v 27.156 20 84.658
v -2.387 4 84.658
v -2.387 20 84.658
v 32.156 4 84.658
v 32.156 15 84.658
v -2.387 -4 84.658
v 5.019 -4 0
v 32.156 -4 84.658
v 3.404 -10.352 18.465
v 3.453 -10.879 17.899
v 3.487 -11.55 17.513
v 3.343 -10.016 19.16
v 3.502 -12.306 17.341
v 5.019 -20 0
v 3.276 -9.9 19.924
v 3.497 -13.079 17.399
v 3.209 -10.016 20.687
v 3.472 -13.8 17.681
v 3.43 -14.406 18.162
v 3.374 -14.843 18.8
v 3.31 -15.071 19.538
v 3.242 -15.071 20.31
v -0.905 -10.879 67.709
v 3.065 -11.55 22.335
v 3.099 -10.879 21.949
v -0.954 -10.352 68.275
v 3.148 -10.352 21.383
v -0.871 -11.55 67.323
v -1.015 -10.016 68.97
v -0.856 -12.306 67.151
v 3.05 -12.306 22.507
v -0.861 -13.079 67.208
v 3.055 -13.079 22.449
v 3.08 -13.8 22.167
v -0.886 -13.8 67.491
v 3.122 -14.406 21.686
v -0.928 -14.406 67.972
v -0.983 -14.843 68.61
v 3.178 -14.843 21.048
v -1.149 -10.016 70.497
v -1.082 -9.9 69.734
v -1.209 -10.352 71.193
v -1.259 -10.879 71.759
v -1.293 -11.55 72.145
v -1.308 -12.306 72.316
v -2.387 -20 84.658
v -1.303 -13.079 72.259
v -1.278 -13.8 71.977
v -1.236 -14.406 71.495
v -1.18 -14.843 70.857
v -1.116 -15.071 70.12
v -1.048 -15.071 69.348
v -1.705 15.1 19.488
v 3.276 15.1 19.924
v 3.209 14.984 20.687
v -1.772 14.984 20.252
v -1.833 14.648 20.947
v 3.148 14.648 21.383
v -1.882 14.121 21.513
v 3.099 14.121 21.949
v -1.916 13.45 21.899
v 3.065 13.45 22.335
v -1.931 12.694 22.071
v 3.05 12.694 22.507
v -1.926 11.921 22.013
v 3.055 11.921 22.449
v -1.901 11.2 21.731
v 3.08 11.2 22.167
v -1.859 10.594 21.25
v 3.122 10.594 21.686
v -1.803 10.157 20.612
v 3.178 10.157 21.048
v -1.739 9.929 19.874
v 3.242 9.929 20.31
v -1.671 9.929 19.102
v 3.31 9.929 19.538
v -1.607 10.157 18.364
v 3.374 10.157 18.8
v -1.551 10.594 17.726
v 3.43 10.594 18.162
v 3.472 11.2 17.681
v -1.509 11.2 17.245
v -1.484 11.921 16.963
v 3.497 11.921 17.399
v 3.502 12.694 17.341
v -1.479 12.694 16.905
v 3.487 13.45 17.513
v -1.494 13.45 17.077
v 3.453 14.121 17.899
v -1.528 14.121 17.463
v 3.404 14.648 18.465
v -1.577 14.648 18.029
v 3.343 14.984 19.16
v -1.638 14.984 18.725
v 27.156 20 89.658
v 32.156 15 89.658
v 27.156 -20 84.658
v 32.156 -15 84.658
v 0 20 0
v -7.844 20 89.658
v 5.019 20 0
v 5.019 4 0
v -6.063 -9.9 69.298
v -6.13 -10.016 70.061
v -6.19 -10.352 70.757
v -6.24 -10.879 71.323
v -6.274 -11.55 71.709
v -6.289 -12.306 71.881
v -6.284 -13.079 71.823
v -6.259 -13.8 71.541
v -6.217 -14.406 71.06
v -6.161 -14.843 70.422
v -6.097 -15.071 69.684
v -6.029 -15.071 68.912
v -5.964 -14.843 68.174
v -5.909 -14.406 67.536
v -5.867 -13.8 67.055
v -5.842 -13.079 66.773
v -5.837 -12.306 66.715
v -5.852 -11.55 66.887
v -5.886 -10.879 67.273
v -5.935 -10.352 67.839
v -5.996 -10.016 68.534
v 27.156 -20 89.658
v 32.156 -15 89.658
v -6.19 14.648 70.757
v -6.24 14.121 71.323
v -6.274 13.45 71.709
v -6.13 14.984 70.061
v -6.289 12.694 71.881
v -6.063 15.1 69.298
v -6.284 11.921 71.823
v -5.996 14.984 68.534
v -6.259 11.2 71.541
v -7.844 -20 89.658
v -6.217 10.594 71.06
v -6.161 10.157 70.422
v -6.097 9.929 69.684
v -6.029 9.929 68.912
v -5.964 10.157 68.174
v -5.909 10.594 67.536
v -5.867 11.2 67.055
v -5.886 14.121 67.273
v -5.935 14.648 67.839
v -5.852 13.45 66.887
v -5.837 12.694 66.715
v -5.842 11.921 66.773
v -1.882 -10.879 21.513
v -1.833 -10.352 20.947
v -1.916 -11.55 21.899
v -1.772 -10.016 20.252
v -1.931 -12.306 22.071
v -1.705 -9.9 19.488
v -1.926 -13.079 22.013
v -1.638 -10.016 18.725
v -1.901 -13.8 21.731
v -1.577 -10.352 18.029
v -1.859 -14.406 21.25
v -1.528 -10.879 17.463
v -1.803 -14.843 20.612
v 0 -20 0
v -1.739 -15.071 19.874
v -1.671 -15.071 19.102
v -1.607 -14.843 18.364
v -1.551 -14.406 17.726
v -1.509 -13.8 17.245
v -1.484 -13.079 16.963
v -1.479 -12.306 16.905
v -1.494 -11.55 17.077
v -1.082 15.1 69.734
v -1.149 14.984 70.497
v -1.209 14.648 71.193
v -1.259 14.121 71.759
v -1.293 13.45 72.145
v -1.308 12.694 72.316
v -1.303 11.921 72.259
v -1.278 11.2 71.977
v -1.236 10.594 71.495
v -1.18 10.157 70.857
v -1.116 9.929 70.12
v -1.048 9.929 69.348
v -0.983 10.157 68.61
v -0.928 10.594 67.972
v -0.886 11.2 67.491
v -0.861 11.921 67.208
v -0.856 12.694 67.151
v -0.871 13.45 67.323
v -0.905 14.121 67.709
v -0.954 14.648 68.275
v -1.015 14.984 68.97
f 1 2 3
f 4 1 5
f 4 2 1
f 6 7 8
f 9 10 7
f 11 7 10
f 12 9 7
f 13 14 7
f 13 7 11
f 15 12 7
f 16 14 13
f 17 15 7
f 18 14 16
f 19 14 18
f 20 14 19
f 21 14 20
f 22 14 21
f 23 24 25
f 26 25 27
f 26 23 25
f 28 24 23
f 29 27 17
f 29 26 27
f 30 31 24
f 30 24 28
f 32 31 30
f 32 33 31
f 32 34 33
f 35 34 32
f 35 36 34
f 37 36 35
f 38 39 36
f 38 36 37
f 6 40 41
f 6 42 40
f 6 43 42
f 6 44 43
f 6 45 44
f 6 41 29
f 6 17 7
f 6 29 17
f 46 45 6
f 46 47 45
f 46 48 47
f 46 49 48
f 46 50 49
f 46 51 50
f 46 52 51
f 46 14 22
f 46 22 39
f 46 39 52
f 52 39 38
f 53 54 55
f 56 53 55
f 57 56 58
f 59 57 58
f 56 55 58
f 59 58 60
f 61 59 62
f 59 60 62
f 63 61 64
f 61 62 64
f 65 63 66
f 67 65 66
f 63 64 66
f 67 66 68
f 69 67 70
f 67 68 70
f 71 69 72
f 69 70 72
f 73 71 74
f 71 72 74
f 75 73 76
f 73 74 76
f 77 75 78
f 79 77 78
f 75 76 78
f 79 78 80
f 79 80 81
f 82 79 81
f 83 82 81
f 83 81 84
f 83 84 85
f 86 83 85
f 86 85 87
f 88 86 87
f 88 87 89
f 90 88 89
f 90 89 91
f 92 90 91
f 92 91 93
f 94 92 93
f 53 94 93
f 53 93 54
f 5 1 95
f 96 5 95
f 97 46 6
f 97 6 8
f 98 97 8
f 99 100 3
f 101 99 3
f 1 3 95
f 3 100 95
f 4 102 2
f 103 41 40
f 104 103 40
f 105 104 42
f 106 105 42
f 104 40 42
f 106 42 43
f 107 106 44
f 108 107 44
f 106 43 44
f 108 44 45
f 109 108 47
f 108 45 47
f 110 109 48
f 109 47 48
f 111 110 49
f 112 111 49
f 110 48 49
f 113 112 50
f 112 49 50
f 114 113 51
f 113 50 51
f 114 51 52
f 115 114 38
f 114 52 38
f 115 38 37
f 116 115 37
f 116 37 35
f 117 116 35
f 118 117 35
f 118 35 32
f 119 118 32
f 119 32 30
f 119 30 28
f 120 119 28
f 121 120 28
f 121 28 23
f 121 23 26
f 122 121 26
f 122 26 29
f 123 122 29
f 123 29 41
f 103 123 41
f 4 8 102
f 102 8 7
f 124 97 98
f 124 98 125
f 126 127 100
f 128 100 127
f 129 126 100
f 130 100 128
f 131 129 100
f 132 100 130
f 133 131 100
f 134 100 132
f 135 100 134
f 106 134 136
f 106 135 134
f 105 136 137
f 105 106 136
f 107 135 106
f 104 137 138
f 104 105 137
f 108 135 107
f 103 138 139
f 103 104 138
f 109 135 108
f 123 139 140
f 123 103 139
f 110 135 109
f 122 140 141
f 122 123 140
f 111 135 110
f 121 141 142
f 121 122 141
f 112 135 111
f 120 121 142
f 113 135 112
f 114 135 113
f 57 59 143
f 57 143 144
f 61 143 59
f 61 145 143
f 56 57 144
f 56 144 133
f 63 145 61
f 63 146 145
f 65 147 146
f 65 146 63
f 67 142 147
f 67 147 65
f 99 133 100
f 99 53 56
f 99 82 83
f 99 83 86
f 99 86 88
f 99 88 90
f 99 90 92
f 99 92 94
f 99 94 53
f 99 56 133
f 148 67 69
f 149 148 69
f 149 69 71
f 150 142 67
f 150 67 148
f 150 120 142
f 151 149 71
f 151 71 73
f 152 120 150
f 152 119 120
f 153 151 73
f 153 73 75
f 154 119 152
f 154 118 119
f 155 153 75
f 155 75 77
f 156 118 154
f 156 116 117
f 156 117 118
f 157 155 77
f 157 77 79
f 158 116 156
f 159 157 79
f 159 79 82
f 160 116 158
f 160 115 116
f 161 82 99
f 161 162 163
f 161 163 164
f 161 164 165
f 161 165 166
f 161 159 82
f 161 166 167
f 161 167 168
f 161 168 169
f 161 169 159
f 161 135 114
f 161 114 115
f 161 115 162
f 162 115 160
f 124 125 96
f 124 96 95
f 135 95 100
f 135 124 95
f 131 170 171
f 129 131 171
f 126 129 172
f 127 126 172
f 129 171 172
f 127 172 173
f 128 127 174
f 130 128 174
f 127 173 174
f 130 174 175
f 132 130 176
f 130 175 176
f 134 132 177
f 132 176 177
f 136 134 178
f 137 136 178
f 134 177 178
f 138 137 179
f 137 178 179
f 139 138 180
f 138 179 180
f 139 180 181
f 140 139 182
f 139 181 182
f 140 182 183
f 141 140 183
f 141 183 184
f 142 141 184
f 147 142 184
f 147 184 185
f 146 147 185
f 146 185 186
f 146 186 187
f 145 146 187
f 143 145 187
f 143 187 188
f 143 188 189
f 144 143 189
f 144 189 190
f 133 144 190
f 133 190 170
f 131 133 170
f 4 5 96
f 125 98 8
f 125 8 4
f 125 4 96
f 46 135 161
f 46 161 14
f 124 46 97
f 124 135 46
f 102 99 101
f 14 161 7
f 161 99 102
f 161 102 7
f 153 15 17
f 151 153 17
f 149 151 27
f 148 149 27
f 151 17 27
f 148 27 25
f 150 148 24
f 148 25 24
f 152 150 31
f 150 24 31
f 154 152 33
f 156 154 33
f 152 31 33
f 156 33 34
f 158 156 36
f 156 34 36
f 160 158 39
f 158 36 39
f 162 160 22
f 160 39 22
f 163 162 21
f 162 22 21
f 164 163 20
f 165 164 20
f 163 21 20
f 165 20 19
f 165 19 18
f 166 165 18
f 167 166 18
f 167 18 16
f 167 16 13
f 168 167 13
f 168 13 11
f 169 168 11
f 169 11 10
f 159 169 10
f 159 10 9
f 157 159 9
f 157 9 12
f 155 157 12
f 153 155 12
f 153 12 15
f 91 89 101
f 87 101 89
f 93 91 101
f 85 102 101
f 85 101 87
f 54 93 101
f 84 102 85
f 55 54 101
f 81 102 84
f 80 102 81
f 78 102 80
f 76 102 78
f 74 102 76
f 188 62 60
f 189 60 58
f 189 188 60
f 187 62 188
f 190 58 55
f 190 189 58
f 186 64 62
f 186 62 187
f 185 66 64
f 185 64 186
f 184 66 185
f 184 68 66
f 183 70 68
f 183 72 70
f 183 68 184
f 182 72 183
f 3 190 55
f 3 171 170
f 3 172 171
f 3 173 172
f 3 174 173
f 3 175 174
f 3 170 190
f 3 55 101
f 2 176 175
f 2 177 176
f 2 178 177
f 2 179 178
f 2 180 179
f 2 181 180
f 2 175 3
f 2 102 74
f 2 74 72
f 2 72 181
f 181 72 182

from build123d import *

# Parameters (mm, degrees)
F1_DEPTH = 20
F2_W     = 8
F2_H     = 84.6575228283
F5_DEPTH = 40.001
F6_R     = 2.6
F7_DEPTH = 12.815167995
F8_SIZE  = 5


with BuildPart() as f1:
    # F0 (on Front) → F1 (new body, symmetric)
    with BuildSketch(Plane.XZ):
        Polygon((-7.8440168473, 89.6575228283), (0, 0), (5.0190991877, 0), (-2.3874743419, 84.6575228283), (32.1559831527, 84.6575228283), (32.1559831527, 89.6575228283), align=None)
    extrude(amount=F1_DEPTH, both=True)

    # F2 (on face) → F3 (join, up to the next surface of F1)
    with BuildSketch(Plane.YZ.offset(32.1559831527)):
        with Locations((0, 42.3287614141)):
            Rectangle(F2_W, F2_H)
    extrude(until=Until.NEXT, dir=(-1, 0, 0))

    # F4 (on face) → F5 (cut, through all)
    with BuildSketch(Plane.XZ.offset(20)):
        Polygon((32.1559831527, 84.6575228283), (5.0190991877, 0), (32.1559831527, 0), align=None)
    extrude(amount=-F5_DEPTH, mode=Mode.SUBTRACT)

    # F6 (on face) → F7 (cut, through all)
    with BuildSketch(Plane(origin=(4.9809734905, 0, 0.4357787137), x_dir=(0, 1, 0), z_dir=(0.9961946981, 0, 0.0871557427))):
        with Locations((12.5, 69.5625566824)):
            Circle(F6_R)
        with Locations((12.5, 19.5625566824)):
            Circle(F6_R)
        with Locations((-12.5, 69.5625566824)):
            Circle(F6_R)
        with Locations((-12.5, 19.5625566824)):
            Circle(F6_R)
    extrude(amount=-F7_DEPTH, mode=Mode.SUBTRACT)

    # F8
    f8_edges = [f1.edges().sort_by_distance(p)[0] for p in [
        (32.155983, -20, 87.157523),
        (32.155983, 20, 87.157523),
    ]]
    chamfer(f8_edges, length=F8_SIZE)


solid = f1.part
